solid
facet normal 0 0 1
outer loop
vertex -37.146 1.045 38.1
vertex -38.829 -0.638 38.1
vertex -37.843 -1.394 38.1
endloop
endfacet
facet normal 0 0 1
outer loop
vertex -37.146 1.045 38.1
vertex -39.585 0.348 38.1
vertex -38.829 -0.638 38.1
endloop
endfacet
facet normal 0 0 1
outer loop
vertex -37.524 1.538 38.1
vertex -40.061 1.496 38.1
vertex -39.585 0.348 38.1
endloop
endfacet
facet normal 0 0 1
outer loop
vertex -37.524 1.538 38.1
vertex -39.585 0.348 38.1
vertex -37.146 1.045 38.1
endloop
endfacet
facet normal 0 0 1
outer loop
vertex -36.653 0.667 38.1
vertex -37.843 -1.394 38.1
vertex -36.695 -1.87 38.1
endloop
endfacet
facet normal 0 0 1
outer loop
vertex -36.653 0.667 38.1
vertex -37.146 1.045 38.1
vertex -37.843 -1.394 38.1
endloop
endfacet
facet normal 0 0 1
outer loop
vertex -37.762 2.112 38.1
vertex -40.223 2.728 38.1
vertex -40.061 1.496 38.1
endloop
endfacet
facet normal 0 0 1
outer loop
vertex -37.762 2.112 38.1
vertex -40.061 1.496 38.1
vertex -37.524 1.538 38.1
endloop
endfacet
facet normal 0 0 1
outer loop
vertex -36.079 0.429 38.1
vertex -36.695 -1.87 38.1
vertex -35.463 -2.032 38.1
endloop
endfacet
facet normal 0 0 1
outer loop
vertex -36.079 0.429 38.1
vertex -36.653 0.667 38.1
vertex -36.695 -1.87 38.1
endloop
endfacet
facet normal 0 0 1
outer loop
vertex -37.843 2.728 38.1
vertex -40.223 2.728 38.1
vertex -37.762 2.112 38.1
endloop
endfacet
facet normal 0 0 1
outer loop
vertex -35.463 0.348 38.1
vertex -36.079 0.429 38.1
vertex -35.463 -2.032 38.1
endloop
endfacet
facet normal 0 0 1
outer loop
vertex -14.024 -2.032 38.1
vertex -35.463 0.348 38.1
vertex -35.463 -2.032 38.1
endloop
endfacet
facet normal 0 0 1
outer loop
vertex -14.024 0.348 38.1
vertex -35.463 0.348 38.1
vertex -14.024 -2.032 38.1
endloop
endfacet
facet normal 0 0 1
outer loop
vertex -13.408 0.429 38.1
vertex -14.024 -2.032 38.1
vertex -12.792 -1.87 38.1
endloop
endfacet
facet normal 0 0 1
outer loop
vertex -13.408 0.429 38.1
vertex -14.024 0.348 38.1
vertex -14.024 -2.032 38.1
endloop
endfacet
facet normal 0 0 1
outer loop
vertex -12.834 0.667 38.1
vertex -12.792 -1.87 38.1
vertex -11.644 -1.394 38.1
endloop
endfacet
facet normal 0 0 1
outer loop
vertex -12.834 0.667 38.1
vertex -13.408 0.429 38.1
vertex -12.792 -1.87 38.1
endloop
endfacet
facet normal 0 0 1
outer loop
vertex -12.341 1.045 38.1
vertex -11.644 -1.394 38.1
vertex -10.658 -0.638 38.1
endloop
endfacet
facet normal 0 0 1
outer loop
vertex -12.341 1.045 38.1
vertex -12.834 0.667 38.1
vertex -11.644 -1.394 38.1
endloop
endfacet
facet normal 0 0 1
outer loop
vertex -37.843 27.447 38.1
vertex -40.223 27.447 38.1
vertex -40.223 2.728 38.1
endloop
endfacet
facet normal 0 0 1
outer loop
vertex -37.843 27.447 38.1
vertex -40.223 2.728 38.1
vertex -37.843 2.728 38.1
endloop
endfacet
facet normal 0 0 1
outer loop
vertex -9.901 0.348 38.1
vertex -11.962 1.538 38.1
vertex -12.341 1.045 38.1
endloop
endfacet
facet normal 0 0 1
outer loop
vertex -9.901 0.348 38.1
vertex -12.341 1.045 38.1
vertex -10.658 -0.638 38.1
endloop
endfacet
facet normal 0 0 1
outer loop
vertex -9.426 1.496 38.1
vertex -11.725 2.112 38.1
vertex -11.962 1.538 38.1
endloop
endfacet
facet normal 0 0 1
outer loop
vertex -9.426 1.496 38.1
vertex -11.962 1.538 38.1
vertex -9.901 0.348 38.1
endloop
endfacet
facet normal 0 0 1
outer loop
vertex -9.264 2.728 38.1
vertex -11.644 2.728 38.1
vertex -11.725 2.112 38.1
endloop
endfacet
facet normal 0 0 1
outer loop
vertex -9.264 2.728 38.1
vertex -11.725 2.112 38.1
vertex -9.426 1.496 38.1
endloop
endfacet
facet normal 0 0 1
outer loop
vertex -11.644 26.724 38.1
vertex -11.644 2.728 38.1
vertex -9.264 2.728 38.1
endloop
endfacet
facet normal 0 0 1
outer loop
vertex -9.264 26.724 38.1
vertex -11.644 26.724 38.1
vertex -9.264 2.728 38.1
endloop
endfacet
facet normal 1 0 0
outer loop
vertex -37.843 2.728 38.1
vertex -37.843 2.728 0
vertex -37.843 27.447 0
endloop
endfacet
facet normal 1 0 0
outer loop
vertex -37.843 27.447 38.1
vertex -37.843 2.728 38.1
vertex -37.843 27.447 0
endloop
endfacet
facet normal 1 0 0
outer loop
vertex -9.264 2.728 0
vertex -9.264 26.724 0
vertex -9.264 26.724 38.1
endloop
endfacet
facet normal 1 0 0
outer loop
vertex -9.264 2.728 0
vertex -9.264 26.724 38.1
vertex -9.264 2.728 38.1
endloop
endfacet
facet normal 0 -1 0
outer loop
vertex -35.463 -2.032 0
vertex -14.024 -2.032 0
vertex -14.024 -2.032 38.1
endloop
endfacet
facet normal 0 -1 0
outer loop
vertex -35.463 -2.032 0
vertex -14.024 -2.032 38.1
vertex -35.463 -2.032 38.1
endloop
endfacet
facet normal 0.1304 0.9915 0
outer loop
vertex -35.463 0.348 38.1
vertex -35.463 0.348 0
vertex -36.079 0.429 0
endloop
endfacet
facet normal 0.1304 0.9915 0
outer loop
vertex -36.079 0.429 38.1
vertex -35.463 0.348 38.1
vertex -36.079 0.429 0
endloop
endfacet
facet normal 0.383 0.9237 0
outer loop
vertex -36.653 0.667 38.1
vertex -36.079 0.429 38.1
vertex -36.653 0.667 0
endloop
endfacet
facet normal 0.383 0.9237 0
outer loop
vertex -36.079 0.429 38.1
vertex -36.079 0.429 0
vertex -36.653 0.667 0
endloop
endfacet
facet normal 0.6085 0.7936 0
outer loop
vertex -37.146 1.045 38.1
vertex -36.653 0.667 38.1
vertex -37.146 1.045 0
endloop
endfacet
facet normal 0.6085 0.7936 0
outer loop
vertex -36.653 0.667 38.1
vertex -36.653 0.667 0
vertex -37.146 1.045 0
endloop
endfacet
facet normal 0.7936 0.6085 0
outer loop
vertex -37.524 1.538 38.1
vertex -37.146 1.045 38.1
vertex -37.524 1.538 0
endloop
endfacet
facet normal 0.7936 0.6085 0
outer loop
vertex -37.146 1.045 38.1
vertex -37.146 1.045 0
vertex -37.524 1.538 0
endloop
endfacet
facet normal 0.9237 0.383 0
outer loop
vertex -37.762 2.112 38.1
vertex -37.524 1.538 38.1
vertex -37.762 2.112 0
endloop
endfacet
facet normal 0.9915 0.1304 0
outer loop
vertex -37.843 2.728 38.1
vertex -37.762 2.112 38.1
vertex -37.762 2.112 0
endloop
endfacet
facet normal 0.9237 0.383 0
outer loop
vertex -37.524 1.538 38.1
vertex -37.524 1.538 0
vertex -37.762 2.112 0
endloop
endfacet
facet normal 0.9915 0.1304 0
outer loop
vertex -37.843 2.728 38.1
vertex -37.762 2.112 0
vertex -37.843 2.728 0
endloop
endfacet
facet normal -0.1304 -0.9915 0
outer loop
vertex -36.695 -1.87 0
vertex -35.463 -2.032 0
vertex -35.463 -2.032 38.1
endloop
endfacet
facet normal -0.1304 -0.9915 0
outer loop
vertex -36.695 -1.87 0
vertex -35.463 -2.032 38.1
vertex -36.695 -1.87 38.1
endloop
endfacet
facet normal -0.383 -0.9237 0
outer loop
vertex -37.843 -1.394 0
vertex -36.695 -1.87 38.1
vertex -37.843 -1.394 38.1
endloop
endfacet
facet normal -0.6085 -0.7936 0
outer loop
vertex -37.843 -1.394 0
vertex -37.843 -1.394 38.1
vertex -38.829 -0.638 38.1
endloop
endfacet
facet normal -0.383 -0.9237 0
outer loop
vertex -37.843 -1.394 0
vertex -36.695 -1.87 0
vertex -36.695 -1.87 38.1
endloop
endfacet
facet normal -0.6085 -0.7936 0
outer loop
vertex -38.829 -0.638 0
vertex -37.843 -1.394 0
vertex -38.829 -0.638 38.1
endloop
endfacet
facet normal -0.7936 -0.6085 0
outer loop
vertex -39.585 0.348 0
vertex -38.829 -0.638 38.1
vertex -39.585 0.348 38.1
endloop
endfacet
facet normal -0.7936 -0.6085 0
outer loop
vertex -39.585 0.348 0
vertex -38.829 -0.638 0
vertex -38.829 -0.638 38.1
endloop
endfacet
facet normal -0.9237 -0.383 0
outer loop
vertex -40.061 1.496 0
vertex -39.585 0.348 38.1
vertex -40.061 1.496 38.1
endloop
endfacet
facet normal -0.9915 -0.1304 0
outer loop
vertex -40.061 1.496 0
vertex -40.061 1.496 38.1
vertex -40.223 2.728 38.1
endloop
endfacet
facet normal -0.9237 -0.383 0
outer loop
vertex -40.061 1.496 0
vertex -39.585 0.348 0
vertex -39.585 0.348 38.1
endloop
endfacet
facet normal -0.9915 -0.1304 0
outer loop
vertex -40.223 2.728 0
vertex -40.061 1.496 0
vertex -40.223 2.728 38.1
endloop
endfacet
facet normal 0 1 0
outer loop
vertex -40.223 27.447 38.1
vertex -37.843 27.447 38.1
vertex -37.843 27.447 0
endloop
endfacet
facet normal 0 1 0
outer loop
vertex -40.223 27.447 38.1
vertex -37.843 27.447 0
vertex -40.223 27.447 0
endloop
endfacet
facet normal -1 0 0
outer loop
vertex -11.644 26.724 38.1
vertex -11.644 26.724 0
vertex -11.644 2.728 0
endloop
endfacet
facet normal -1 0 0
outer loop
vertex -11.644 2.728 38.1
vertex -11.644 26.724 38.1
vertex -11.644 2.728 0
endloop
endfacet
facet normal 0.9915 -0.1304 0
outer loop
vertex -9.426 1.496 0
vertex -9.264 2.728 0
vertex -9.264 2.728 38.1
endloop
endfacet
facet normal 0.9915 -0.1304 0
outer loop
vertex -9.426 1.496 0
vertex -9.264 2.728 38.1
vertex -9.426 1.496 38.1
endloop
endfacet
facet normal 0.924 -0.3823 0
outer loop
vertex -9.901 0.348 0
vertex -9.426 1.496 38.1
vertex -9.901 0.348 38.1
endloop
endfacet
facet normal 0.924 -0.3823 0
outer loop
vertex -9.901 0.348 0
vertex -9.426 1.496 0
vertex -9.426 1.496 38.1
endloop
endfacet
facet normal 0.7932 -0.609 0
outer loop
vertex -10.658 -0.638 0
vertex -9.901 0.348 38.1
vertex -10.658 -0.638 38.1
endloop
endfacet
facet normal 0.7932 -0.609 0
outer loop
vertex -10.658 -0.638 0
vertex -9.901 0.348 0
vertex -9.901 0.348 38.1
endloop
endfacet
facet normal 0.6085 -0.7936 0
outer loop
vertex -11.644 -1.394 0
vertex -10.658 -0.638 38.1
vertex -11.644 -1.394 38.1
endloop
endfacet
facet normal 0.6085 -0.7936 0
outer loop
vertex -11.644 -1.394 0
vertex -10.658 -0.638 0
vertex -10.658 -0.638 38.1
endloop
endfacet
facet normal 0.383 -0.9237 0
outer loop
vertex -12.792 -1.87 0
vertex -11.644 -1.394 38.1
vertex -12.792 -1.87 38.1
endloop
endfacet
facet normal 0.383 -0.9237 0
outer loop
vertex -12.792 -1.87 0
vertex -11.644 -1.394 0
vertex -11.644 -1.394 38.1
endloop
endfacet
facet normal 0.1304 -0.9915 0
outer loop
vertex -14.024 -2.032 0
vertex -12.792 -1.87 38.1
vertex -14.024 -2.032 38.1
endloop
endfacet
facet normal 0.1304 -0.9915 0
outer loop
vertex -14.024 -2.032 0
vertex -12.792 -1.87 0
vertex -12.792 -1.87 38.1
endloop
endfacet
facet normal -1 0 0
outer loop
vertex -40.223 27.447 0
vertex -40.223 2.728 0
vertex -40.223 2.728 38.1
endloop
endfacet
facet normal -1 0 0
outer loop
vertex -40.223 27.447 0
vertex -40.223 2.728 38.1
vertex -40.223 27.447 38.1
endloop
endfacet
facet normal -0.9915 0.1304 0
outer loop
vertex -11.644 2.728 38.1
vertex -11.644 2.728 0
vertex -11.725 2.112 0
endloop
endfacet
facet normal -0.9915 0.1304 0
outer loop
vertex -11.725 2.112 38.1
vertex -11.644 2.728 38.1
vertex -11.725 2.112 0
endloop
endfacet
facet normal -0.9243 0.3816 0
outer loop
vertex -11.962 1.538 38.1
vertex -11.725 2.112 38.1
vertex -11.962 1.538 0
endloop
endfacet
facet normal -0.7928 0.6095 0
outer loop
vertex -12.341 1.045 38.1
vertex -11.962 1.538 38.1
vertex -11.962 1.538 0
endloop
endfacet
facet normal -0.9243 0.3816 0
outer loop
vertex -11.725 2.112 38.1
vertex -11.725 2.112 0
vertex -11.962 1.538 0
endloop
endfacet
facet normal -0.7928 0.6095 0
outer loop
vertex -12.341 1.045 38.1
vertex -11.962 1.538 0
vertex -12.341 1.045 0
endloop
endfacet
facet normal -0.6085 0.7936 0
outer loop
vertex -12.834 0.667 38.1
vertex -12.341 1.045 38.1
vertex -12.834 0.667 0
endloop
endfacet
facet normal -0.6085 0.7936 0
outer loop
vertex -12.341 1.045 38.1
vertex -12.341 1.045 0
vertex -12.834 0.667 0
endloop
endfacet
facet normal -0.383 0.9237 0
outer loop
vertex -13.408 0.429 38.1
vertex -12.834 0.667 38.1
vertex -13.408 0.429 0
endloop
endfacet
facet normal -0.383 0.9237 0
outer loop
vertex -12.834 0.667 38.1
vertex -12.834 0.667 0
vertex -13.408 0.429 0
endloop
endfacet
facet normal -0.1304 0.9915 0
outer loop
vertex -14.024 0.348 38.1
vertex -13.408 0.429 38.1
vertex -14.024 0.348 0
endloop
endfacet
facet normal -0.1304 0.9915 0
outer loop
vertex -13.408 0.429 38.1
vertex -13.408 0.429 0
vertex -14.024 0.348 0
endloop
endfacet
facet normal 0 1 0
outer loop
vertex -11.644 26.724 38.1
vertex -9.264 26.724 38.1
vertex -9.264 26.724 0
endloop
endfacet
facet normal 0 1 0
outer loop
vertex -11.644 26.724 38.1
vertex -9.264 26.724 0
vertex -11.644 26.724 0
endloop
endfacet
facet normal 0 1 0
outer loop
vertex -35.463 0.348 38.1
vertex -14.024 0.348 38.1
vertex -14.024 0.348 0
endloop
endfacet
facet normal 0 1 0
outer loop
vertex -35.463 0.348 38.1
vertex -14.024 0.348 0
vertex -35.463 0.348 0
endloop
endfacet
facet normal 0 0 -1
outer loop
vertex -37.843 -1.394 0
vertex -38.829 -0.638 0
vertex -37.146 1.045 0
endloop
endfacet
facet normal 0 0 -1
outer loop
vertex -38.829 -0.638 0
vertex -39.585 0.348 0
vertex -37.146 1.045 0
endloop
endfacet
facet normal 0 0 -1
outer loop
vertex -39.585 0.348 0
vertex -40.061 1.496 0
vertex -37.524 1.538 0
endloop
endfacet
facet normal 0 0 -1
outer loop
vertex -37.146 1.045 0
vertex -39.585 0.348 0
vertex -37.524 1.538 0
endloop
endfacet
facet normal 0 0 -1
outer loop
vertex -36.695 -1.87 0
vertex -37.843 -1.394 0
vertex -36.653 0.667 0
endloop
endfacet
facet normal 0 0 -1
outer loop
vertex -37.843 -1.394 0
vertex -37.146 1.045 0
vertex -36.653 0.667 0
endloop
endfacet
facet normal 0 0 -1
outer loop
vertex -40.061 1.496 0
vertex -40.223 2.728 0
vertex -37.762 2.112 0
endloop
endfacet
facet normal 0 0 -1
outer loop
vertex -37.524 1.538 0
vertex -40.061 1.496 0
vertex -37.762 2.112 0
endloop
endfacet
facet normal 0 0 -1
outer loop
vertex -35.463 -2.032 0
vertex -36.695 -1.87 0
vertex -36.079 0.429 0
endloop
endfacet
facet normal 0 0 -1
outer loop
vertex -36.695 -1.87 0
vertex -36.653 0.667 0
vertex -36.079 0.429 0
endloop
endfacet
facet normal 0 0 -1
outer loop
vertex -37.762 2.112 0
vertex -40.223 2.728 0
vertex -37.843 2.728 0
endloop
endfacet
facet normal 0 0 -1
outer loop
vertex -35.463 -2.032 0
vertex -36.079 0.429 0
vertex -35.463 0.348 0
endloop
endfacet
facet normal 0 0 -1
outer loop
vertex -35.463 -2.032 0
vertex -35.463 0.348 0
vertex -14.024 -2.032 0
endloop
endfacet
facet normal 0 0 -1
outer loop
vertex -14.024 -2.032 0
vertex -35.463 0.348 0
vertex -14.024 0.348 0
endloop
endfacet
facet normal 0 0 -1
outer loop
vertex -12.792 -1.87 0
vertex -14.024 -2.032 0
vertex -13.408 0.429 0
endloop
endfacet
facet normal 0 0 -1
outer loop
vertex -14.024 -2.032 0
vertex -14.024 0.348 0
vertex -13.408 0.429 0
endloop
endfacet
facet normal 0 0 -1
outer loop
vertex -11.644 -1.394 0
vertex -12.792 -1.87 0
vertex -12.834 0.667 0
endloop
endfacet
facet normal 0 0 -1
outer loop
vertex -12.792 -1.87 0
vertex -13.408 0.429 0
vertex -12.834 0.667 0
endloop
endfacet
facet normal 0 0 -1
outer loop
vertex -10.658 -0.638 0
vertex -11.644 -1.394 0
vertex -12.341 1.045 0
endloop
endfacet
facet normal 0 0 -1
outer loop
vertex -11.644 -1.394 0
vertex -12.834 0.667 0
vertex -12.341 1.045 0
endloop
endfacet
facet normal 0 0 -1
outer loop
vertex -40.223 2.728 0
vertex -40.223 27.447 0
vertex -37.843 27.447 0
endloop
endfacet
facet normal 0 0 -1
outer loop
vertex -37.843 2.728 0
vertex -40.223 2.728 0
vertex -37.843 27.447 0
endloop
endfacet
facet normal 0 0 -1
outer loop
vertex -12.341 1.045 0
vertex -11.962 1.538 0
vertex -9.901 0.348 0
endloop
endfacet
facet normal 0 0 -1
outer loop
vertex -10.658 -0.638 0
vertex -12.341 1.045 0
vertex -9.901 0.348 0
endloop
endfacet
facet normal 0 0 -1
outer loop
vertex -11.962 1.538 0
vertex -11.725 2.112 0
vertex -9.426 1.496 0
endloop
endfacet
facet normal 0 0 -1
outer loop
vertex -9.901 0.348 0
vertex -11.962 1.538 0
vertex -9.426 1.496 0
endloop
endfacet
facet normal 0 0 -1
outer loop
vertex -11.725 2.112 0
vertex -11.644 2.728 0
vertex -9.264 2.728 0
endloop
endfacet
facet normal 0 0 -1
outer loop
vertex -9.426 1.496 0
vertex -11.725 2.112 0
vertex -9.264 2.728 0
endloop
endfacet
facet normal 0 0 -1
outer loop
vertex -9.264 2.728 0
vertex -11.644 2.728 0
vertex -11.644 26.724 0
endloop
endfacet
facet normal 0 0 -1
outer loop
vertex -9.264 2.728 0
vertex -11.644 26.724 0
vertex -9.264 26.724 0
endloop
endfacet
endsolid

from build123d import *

# Parameters (mm, degrees)
BOSS_EXTRUDE1_DEPTH    = 38.1
CONVERT_SOLID1_DEPTH   = 38.1
CONVERT_SOLID1_2_DEPTH = 38.1


# Read off the part's stored shape, not the designer's step: Convert-Solid1
with BuildPart() as part:
    # Sketch1 → Boss-Extrude1 (new body)
    with BuildSketch(Plane.XY):
        Polygon((-38.191130673, 27.446595767), (-38.191130673, 0), (-11.295536696, 0), (-11.295536696, 26.723586817), (-9.263536696, 26.723586817), (-9.263536696, -2.032), (-40.223130673, -2.032), (-40.223130673, 27.446595767), align=None)
    extrude(amount=BOSS_EXTRUDE1_DEPTH)

    # Convert-Solid1 outline → Convert-Solid1 (cut)
    with BuildSketch(Plane.XY):
        with BuildLine():
            Line((-9.263536696, -2.032), (-9.263536696, 2.728000132))
            ThreePointArc((-9.263536696, 2.728000132), (-10.657708456, -0.63782824), (-14.023536828, -2.032))
            Line((-14.023536828, -2.032), (-9.263536696, -2.032))
        make_face()
        with BuildLine():
            Line((-40.223130673, -2.032), (-35.463130541, -2.032))
            ThreePointArc((-35.463130541, -2.032), (-38.828958913, -0.63782824), (-40.223130673, 2.728000132))
            Line((-40.223130673, 2.728000132), (-40.223130673, -2.032))
        make_face()
    extrude(amount=CONVERT_SOLID1_DEPTH, mode=Mode.SUBTRACT)

    # Convert-Solid1 2 outline → Convert-Solid1 2 (add)
    with BuildSketch(Plane.XY):
        with BuildLine():
            Line((-11.295536696, 0), (-11.295536696, 26.723586817))
            Line((-11.295536696, 26.723586817), (-11.643536762, 26.723586817))
            Line((-11.643536762, 26.723586817), (-11.643536762, 2.728000132))
            ThreePointArc((-11.643536762, 2.728000132), (-12.340622642, 1.045085946), (-14.023536828, 0.348000066))
            Line((-14.023536828, 0.348000066), (-35.463130541, 0.348000066))
            ThreePointArc((-35.463130541, 0.348000066), (-37.146044727, 1.045085946), (-37.843130607, 2.728000132))
            Line((-37.843130607, 2.728000132), (-37.843130607, 27.446595767))
            Line((-37.843130607, 27.446595767), (-38.191130673, 27.446595767))
            Line((-38.191130673, 27.446595767), (-38.191130673, 0))
            Line((-38.191130673, 0), (-11.295536696, 0))
        make_face()
    extrude(amount=CONVERT_SOLID1_2_DEPTH)


solid = part.part
